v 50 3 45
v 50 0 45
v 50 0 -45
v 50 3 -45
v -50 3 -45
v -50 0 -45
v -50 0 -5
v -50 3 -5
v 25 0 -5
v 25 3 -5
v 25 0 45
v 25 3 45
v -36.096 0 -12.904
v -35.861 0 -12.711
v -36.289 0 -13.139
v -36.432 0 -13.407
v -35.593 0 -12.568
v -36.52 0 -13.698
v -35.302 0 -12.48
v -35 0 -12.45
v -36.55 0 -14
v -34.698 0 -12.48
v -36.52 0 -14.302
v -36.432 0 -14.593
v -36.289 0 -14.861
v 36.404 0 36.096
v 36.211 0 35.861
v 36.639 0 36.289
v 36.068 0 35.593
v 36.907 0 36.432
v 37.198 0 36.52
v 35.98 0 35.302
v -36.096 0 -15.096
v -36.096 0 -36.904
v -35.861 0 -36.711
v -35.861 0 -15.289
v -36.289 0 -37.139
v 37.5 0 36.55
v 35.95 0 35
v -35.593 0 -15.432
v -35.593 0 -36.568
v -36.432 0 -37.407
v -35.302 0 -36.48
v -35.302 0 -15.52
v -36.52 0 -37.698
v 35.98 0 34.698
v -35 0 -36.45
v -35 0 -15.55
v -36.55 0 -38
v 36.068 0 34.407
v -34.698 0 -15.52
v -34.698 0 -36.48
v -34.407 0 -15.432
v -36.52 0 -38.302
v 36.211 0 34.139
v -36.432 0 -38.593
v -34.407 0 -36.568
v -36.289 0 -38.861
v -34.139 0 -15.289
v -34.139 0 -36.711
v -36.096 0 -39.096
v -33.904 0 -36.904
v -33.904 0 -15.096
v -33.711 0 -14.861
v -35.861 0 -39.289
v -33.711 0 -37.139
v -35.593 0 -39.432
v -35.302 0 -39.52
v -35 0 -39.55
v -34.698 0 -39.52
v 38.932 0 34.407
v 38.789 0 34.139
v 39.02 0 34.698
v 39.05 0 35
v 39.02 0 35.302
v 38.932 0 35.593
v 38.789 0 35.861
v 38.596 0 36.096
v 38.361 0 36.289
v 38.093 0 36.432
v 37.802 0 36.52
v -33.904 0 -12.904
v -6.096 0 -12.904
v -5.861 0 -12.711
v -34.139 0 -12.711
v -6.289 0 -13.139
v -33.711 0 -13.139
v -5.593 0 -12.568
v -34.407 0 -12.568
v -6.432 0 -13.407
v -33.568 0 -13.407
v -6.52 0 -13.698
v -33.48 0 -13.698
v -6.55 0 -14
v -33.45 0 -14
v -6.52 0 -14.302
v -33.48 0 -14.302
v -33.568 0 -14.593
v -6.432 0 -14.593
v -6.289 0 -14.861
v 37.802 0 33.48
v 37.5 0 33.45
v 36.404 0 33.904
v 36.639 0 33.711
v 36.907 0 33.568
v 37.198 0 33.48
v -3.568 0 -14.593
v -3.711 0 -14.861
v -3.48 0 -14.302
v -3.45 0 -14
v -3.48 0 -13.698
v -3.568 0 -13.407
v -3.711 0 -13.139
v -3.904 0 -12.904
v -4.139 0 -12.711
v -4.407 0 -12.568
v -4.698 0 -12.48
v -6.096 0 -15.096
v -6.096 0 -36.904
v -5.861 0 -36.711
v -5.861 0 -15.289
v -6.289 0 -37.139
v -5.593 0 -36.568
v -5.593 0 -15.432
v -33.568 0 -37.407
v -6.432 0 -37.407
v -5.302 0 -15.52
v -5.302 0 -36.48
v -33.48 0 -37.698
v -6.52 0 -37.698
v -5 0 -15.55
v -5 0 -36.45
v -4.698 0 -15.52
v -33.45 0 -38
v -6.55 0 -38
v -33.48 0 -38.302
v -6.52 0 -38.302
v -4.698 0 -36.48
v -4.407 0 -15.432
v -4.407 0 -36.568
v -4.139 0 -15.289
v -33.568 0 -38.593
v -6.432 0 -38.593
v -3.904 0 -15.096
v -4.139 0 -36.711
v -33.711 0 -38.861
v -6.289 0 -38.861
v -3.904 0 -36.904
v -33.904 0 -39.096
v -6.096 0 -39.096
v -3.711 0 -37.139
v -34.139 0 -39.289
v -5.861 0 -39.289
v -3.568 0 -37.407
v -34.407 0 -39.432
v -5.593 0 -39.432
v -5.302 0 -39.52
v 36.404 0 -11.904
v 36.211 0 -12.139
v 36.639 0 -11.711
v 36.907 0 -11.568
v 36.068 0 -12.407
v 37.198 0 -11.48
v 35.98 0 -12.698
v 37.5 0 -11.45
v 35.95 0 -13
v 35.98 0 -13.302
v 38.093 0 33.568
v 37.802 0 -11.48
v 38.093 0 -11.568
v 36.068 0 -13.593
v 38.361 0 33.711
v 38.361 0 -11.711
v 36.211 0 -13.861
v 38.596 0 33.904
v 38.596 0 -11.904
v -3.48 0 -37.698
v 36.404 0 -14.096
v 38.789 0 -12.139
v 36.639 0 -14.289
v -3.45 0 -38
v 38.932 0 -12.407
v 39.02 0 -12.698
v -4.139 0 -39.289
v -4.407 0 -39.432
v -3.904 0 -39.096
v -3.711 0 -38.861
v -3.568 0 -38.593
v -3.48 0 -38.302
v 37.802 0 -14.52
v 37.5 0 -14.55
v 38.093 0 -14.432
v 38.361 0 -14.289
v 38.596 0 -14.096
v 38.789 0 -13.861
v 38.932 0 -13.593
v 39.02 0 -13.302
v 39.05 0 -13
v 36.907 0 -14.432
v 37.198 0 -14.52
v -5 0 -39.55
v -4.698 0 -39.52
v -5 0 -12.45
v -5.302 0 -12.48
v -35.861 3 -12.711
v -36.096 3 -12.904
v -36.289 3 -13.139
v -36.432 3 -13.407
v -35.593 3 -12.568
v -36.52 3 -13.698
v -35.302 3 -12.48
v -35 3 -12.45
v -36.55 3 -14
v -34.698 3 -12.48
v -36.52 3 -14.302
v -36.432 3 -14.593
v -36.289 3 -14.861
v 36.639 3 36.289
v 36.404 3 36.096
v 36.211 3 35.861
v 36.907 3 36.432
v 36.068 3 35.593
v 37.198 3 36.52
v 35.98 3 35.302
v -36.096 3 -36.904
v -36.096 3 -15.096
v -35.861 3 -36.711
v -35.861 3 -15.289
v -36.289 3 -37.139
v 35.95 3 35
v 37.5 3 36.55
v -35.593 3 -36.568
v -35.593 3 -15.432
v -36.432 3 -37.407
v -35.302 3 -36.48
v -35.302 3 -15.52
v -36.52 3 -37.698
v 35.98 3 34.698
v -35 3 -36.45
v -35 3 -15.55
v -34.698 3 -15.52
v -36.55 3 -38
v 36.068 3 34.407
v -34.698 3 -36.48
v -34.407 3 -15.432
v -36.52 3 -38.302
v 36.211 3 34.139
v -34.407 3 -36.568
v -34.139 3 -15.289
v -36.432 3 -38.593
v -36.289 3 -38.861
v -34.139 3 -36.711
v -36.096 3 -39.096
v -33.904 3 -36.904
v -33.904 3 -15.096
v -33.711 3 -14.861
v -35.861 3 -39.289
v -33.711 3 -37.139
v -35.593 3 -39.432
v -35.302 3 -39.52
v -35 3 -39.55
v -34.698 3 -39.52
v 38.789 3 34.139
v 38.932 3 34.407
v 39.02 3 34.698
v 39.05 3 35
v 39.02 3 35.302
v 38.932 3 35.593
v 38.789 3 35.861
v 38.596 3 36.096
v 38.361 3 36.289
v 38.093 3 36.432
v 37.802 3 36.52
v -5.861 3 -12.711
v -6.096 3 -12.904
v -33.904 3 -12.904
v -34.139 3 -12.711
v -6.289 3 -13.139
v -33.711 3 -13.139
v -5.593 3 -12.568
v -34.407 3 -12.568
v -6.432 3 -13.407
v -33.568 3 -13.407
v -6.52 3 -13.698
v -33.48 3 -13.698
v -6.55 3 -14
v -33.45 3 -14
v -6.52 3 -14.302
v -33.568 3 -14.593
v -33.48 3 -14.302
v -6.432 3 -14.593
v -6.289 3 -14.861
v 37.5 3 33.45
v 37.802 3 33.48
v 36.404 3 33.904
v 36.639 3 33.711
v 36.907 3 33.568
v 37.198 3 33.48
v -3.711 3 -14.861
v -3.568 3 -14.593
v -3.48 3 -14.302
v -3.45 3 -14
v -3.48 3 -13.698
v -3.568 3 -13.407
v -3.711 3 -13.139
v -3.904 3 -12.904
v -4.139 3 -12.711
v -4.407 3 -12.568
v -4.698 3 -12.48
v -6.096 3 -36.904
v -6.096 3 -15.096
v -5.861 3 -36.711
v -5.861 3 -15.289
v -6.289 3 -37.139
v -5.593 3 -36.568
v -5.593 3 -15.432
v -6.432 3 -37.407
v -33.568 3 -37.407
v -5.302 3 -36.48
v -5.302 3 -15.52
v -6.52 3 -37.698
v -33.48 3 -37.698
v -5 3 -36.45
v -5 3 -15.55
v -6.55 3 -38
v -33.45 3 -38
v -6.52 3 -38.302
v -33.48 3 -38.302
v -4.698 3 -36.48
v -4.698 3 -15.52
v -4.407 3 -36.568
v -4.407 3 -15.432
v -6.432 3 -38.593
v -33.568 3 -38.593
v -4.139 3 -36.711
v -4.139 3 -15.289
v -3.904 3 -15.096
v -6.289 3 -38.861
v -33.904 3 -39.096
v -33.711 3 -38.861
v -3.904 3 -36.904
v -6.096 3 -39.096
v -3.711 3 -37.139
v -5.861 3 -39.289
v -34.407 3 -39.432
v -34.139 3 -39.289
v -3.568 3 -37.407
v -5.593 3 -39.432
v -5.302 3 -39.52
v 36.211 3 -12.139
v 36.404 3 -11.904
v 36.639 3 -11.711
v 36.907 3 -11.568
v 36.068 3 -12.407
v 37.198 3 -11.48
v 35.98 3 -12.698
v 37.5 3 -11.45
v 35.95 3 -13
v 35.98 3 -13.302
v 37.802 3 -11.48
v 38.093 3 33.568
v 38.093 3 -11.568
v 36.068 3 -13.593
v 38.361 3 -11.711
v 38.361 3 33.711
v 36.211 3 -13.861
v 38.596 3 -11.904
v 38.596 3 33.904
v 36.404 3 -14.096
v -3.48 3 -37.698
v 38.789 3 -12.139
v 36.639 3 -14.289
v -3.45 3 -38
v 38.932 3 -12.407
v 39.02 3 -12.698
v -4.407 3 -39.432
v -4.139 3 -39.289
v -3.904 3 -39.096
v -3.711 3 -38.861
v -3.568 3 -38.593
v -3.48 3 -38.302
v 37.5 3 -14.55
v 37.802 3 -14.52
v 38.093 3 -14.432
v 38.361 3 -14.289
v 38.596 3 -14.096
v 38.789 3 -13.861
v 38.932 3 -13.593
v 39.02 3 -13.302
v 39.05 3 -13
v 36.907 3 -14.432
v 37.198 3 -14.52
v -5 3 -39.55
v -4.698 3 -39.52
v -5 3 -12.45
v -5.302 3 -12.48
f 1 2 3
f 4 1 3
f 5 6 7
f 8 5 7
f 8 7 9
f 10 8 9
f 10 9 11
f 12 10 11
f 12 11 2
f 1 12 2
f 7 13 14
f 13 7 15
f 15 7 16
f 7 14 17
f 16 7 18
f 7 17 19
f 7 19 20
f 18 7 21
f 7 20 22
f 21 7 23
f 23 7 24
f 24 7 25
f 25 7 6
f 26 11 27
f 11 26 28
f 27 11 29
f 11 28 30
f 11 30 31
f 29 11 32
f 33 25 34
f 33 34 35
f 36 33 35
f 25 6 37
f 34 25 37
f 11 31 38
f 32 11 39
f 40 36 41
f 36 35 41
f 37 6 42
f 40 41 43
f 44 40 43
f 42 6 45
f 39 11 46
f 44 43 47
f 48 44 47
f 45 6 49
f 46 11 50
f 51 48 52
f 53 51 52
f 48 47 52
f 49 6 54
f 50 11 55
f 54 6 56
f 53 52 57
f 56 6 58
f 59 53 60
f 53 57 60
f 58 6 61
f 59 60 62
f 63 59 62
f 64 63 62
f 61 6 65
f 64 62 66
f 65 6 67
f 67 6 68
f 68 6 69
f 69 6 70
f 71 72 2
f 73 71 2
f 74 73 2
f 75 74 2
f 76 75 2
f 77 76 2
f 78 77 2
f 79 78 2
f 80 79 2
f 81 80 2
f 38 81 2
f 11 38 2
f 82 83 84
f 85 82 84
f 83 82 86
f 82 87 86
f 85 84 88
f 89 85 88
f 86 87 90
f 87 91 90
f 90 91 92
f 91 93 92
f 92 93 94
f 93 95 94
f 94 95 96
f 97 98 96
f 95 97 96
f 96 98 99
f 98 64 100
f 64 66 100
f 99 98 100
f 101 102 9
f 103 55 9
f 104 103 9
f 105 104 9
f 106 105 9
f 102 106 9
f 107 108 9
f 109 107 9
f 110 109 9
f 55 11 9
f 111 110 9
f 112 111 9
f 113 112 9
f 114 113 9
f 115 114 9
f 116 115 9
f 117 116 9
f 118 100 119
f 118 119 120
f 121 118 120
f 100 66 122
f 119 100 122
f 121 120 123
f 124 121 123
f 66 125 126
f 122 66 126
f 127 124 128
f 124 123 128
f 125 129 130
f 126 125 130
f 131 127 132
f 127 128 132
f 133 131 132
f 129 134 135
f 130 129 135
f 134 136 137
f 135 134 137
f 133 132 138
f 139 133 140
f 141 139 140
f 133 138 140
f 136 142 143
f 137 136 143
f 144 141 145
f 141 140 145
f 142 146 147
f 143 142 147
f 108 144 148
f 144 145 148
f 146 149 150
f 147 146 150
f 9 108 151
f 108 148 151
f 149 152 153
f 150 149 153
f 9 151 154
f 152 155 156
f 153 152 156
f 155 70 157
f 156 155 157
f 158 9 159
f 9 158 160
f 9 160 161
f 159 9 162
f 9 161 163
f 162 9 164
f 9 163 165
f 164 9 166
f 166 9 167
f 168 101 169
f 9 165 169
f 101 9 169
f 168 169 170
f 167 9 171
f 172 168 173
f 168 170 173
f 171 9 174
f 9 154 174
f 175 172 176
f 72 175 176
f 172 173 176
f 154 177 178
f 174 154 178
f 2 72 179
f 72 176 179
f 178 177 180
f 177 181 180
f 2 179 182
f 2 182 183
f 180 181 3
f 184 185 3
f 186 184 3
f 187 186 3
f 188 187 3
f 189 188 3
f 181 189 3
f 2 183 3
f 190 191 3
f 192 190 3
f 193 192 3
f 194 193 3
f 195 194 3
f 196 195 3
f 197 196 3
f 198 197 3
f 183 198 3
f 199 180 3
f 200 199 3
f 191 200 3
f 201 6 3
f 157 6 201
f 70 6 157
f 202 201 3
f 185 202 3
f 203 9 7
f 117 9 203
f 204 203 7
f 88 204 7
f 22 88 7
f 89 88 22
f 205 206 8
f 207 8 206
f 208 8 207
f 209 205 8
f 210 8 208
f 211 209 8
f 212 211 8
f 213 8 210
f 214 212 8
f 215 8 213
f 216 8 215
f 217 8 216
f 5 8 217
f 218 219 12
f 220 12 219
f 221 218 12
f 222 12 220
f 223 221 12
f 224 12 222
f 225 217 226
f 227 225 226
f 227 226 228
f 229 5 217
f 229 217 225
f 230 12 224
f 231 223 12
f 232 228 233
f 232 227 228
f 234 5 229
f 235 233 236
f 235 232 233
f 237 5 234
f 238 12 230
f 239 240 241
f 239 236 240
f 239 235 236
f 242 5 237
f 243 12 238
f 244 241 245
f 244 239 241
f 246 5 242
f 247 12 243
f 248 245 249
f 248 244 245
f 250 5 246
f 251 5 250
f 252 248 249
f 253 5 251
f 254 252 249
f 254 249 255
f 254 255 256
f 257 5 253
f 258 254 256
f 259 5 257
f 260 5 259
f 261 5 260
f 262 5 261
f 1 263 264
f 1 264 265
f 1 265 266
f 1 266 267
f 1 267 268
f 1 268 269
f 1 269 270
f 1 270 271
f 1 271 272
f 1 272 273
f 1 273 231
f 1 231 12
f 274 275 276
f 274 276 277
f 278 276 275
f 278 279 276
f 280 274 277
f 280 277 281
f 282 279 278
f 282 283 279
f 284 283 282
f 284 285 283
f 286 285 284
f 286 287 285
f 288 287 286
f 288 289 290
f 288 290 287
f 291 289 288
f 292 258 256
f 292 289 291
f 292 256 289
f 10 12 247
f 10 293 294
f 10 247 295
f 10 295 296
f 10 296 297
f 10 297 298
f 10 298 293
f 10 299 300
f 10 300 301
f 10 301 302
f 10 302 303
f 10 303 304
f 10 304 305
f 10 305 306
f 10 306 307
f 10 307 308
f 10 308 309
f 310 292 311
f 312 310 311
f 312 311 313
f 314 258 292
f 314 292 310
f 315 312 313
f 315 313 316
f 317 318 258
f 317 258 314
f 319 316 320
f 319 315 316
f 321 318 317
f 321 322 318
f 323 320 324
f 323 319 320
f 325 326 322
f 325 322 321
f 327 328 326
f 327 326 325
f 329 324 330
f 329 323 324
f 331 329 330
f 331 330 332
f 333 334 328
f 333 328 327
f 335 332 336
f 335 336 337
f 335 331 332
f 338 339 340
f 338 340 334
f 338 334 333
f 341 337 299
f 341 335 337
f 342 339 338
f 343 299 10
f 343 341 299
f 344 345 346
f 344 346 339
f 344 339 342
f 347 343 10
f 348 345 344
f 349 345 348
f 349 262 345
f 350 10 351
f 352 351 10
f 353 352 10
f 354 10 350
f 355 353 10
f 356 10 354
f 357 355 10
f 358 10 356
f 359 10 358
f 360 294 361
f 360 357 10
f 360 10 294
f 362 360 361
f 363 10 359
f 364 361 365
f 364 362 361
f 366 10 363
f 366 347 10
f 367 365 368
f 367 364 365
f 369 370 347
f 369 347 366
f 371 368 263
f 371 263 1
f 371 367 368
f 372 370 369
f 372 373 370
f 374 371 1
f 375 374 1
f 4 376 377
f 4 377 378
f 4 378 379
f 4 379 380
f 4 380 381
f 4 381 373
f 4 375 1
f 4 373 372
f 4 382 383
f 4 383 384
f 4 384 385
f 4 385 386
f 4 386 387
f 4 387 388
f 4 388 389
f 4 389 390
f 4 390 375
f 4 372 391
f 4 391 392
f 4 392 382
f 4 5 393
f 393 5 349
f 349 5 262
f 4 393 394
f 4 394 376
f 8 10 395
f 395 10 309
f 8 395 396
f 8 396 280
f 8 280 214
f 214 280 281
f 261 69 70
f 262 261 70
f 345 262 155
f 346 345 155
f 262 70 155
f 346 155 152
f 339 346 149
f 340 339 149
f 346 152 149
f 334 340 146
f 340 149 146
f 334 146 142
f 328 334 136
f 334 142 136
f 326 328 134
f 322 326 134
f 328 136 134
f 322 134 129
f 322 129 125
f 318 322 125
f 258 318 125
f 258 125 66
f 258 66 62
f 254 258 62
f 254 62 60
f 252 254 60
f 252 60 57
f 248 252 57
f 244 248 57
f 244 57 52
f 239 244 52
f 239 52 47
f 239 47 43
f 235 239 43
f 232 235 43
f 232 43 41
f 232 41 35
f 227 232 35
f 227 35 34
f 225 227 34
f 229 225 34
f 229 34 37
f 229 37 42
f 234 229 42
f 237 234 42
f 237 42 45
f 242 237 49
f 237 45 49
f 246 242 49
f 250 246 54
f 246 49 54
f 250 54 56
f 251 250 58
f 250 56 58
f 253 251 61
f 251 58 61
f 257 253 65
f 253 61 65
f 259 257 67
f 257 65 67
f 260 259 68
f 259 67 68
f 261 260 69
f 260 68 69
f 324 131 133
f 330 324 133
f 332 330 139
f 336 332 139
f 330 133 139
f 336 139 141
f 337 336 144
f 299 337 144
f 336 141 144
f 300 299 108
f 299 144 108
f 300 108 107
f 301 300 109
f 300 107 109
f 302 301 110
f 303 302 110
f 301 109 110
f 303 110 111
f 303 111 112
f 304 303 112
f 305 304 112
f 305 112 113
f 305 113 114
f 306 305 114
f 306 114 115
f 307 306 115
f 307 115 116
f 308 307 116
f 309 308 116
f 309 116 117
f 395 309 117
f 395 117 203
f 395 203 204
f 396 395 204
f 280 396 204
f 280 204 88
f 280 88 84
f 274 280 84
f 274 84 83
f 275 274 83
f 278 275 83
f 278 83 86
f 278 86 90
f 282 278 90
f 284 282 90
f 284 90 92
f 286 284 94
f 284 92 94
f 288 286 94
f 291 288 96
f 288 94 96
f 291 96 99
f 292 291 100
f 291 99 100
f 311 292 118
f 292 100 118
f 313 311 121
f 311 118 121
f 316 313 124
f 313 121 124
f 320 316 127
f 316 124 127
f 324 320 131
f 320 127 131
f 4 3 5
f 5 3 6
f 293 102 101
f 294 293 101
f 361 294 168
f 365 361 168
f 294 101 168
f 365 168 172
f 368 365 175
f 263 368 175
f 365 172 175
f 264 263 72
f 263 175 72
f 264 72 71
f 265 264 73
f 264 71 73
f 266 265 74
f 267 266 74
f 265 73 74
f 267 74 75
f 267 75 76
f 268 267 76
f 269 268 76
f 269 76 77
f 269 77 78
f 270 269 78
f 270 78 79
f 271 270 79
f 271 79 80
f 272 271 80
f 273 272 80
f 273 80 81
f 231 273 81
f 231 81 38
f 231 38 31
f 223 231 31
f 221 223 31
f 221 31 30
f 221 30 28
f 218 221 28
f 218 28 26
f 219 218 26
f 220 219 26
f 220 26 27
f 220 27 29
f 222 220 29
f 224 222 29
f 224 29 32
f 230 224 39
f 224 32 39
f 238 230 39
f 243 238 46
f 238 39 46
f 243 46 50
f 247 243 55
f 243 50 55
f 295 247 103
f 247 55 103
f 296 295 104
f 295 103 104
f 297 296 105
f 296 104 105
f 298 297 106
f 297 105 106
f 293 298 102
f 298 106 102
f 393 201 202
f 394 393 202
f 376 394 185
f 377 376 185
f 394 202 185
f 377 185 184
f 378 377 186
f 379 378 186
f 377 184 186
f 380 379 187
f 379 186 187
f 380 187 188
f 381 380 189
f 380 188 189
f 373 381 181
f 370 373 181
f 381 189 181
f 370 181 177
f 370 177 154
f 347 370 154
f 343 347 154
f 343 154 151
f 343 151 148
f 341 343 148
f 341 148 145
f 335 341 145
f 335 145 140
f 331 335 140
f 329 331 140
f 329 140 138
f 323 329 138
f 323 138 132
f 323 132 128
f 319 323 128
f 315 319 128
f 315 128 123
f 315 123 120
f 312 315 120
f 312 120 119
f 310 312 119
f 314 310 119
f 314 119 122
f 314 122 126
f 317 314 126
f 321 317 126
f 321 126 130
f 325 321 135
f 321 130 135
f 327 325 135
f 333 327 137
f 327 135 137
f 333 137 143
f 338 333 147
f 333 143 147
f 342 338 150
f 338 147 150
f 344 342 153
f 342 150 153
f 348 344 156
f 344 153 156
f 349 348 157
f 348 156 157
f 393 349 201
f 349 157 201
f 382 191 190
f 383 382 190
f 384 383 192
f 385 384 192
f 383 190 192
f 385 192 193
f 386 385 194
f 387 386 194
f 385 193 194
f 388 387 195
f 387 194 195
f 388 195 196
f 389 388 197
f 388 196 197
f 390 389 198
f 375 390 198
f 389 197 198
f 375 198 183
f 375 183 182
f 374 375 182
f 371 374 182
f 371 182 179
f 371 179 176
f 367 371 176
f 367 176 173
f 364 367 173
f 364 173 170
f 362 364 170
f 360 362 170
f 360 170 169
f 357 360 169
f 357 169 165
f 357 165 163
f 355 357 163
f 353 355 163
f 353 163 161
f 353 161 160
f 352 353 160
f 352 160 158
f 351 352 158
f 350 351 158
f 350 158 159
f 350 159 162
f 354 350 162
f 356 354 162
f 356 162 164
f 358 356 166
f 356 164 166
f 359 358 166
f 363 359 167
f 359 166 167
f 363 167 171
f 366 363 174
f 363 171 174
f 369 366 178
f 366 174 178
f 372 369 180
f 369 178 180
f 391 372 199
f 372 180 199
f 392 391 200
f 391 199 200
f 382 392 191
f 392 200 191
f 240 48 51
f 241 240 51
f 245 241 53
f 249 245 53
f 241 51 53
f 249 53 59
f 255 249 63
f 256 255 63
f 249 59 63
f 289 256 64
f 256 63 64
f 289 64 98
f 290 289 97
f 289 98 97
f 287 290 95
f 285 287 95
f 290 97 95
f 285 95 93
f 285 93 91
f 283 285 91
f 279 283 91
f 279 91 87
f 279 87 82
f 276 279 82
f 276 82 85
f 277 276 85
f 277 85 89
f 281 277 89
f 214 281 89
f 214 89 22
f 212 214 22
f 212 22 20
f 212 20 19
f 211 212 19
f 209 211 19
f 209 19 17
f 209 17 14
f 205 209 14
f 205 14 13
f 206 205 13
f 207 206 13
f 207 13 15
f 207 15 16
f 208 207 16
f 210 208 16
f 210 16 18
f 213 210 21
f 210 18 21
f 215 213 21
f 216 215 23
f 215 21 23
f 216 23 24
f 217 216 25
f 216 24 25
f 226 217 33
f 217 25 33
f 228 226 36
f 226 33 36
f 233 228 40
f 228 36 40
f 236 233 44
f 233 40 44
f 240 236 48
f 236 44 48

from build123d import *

# Parameters (mm, degrees)
EXTRUDE_1_DEPTH     = 3
SKETCH_2_R          = 1.55
CUT_EXTRUDE_1_DEPTH = 10
SKETCH_3_R          = 1.55
CUT_EXTRUDE_2_DEPTH = 10


with BuildPart() as part:
    # 草图1 → 凸台-拉伸1 (new body)
    with BuildSketch(Plane(origin=(0, 0, 0), x_dir=(1, 0, 0), z_dir=(0, 1, 0))):
        Polygon((50, 45), (-50, 45), (-50, 5), (25, 5), (25, -45), (50, -45), align=None)
    extrude(amount=EXTRUDE_1_DEPTH)

    # 草图2 → 切除-拉伸1 (cut)
    with BuildSketch(Plane(origin=(0, 0, 0), x_dir=(-1, 0, 0), z_dir=(0, -1, 0))):
        with Locations(Location((5, 38, 0), (0, 0, 90))):
            Circle(SKETCH_2_R)
        with Locations(Location((5, 14, 0), (0, 0, 90))):
            Circle(SKETCH_2_R)
        with Locations(Location((35, 38, 0), (0, 0, 90))):
            Circle(SKETCH_2_R)
        with Locations(Location((35, 14, 0), (0, 0, 90))):
            Circle(SKETCH_2_R)
    extrude(amount=-CUT_EXTRUDE_1_DEPTH, mode=Mode.SUBTRACT)

    # 草图3 → 切除-拉伸2 (cut)
    with BuildSketch(Plane(origin=(0, 0, 0), x_dir=(-1, 0, 0), z_dir=(0, -1, 0))):
        with Locations(Location((-37.5, 13, 0), (0, 0, 90))):
            Circle(SKETCH_3_R)
        with Locations(Location((-37.5, -35, 0), (0, 0, 90))):
            Circle(SKETCH_3_R)
    extrude(amount=-CUT_EXTRUDE_2_DEPTH, mode=Mode.SUBTRACT)


solid = part.part
